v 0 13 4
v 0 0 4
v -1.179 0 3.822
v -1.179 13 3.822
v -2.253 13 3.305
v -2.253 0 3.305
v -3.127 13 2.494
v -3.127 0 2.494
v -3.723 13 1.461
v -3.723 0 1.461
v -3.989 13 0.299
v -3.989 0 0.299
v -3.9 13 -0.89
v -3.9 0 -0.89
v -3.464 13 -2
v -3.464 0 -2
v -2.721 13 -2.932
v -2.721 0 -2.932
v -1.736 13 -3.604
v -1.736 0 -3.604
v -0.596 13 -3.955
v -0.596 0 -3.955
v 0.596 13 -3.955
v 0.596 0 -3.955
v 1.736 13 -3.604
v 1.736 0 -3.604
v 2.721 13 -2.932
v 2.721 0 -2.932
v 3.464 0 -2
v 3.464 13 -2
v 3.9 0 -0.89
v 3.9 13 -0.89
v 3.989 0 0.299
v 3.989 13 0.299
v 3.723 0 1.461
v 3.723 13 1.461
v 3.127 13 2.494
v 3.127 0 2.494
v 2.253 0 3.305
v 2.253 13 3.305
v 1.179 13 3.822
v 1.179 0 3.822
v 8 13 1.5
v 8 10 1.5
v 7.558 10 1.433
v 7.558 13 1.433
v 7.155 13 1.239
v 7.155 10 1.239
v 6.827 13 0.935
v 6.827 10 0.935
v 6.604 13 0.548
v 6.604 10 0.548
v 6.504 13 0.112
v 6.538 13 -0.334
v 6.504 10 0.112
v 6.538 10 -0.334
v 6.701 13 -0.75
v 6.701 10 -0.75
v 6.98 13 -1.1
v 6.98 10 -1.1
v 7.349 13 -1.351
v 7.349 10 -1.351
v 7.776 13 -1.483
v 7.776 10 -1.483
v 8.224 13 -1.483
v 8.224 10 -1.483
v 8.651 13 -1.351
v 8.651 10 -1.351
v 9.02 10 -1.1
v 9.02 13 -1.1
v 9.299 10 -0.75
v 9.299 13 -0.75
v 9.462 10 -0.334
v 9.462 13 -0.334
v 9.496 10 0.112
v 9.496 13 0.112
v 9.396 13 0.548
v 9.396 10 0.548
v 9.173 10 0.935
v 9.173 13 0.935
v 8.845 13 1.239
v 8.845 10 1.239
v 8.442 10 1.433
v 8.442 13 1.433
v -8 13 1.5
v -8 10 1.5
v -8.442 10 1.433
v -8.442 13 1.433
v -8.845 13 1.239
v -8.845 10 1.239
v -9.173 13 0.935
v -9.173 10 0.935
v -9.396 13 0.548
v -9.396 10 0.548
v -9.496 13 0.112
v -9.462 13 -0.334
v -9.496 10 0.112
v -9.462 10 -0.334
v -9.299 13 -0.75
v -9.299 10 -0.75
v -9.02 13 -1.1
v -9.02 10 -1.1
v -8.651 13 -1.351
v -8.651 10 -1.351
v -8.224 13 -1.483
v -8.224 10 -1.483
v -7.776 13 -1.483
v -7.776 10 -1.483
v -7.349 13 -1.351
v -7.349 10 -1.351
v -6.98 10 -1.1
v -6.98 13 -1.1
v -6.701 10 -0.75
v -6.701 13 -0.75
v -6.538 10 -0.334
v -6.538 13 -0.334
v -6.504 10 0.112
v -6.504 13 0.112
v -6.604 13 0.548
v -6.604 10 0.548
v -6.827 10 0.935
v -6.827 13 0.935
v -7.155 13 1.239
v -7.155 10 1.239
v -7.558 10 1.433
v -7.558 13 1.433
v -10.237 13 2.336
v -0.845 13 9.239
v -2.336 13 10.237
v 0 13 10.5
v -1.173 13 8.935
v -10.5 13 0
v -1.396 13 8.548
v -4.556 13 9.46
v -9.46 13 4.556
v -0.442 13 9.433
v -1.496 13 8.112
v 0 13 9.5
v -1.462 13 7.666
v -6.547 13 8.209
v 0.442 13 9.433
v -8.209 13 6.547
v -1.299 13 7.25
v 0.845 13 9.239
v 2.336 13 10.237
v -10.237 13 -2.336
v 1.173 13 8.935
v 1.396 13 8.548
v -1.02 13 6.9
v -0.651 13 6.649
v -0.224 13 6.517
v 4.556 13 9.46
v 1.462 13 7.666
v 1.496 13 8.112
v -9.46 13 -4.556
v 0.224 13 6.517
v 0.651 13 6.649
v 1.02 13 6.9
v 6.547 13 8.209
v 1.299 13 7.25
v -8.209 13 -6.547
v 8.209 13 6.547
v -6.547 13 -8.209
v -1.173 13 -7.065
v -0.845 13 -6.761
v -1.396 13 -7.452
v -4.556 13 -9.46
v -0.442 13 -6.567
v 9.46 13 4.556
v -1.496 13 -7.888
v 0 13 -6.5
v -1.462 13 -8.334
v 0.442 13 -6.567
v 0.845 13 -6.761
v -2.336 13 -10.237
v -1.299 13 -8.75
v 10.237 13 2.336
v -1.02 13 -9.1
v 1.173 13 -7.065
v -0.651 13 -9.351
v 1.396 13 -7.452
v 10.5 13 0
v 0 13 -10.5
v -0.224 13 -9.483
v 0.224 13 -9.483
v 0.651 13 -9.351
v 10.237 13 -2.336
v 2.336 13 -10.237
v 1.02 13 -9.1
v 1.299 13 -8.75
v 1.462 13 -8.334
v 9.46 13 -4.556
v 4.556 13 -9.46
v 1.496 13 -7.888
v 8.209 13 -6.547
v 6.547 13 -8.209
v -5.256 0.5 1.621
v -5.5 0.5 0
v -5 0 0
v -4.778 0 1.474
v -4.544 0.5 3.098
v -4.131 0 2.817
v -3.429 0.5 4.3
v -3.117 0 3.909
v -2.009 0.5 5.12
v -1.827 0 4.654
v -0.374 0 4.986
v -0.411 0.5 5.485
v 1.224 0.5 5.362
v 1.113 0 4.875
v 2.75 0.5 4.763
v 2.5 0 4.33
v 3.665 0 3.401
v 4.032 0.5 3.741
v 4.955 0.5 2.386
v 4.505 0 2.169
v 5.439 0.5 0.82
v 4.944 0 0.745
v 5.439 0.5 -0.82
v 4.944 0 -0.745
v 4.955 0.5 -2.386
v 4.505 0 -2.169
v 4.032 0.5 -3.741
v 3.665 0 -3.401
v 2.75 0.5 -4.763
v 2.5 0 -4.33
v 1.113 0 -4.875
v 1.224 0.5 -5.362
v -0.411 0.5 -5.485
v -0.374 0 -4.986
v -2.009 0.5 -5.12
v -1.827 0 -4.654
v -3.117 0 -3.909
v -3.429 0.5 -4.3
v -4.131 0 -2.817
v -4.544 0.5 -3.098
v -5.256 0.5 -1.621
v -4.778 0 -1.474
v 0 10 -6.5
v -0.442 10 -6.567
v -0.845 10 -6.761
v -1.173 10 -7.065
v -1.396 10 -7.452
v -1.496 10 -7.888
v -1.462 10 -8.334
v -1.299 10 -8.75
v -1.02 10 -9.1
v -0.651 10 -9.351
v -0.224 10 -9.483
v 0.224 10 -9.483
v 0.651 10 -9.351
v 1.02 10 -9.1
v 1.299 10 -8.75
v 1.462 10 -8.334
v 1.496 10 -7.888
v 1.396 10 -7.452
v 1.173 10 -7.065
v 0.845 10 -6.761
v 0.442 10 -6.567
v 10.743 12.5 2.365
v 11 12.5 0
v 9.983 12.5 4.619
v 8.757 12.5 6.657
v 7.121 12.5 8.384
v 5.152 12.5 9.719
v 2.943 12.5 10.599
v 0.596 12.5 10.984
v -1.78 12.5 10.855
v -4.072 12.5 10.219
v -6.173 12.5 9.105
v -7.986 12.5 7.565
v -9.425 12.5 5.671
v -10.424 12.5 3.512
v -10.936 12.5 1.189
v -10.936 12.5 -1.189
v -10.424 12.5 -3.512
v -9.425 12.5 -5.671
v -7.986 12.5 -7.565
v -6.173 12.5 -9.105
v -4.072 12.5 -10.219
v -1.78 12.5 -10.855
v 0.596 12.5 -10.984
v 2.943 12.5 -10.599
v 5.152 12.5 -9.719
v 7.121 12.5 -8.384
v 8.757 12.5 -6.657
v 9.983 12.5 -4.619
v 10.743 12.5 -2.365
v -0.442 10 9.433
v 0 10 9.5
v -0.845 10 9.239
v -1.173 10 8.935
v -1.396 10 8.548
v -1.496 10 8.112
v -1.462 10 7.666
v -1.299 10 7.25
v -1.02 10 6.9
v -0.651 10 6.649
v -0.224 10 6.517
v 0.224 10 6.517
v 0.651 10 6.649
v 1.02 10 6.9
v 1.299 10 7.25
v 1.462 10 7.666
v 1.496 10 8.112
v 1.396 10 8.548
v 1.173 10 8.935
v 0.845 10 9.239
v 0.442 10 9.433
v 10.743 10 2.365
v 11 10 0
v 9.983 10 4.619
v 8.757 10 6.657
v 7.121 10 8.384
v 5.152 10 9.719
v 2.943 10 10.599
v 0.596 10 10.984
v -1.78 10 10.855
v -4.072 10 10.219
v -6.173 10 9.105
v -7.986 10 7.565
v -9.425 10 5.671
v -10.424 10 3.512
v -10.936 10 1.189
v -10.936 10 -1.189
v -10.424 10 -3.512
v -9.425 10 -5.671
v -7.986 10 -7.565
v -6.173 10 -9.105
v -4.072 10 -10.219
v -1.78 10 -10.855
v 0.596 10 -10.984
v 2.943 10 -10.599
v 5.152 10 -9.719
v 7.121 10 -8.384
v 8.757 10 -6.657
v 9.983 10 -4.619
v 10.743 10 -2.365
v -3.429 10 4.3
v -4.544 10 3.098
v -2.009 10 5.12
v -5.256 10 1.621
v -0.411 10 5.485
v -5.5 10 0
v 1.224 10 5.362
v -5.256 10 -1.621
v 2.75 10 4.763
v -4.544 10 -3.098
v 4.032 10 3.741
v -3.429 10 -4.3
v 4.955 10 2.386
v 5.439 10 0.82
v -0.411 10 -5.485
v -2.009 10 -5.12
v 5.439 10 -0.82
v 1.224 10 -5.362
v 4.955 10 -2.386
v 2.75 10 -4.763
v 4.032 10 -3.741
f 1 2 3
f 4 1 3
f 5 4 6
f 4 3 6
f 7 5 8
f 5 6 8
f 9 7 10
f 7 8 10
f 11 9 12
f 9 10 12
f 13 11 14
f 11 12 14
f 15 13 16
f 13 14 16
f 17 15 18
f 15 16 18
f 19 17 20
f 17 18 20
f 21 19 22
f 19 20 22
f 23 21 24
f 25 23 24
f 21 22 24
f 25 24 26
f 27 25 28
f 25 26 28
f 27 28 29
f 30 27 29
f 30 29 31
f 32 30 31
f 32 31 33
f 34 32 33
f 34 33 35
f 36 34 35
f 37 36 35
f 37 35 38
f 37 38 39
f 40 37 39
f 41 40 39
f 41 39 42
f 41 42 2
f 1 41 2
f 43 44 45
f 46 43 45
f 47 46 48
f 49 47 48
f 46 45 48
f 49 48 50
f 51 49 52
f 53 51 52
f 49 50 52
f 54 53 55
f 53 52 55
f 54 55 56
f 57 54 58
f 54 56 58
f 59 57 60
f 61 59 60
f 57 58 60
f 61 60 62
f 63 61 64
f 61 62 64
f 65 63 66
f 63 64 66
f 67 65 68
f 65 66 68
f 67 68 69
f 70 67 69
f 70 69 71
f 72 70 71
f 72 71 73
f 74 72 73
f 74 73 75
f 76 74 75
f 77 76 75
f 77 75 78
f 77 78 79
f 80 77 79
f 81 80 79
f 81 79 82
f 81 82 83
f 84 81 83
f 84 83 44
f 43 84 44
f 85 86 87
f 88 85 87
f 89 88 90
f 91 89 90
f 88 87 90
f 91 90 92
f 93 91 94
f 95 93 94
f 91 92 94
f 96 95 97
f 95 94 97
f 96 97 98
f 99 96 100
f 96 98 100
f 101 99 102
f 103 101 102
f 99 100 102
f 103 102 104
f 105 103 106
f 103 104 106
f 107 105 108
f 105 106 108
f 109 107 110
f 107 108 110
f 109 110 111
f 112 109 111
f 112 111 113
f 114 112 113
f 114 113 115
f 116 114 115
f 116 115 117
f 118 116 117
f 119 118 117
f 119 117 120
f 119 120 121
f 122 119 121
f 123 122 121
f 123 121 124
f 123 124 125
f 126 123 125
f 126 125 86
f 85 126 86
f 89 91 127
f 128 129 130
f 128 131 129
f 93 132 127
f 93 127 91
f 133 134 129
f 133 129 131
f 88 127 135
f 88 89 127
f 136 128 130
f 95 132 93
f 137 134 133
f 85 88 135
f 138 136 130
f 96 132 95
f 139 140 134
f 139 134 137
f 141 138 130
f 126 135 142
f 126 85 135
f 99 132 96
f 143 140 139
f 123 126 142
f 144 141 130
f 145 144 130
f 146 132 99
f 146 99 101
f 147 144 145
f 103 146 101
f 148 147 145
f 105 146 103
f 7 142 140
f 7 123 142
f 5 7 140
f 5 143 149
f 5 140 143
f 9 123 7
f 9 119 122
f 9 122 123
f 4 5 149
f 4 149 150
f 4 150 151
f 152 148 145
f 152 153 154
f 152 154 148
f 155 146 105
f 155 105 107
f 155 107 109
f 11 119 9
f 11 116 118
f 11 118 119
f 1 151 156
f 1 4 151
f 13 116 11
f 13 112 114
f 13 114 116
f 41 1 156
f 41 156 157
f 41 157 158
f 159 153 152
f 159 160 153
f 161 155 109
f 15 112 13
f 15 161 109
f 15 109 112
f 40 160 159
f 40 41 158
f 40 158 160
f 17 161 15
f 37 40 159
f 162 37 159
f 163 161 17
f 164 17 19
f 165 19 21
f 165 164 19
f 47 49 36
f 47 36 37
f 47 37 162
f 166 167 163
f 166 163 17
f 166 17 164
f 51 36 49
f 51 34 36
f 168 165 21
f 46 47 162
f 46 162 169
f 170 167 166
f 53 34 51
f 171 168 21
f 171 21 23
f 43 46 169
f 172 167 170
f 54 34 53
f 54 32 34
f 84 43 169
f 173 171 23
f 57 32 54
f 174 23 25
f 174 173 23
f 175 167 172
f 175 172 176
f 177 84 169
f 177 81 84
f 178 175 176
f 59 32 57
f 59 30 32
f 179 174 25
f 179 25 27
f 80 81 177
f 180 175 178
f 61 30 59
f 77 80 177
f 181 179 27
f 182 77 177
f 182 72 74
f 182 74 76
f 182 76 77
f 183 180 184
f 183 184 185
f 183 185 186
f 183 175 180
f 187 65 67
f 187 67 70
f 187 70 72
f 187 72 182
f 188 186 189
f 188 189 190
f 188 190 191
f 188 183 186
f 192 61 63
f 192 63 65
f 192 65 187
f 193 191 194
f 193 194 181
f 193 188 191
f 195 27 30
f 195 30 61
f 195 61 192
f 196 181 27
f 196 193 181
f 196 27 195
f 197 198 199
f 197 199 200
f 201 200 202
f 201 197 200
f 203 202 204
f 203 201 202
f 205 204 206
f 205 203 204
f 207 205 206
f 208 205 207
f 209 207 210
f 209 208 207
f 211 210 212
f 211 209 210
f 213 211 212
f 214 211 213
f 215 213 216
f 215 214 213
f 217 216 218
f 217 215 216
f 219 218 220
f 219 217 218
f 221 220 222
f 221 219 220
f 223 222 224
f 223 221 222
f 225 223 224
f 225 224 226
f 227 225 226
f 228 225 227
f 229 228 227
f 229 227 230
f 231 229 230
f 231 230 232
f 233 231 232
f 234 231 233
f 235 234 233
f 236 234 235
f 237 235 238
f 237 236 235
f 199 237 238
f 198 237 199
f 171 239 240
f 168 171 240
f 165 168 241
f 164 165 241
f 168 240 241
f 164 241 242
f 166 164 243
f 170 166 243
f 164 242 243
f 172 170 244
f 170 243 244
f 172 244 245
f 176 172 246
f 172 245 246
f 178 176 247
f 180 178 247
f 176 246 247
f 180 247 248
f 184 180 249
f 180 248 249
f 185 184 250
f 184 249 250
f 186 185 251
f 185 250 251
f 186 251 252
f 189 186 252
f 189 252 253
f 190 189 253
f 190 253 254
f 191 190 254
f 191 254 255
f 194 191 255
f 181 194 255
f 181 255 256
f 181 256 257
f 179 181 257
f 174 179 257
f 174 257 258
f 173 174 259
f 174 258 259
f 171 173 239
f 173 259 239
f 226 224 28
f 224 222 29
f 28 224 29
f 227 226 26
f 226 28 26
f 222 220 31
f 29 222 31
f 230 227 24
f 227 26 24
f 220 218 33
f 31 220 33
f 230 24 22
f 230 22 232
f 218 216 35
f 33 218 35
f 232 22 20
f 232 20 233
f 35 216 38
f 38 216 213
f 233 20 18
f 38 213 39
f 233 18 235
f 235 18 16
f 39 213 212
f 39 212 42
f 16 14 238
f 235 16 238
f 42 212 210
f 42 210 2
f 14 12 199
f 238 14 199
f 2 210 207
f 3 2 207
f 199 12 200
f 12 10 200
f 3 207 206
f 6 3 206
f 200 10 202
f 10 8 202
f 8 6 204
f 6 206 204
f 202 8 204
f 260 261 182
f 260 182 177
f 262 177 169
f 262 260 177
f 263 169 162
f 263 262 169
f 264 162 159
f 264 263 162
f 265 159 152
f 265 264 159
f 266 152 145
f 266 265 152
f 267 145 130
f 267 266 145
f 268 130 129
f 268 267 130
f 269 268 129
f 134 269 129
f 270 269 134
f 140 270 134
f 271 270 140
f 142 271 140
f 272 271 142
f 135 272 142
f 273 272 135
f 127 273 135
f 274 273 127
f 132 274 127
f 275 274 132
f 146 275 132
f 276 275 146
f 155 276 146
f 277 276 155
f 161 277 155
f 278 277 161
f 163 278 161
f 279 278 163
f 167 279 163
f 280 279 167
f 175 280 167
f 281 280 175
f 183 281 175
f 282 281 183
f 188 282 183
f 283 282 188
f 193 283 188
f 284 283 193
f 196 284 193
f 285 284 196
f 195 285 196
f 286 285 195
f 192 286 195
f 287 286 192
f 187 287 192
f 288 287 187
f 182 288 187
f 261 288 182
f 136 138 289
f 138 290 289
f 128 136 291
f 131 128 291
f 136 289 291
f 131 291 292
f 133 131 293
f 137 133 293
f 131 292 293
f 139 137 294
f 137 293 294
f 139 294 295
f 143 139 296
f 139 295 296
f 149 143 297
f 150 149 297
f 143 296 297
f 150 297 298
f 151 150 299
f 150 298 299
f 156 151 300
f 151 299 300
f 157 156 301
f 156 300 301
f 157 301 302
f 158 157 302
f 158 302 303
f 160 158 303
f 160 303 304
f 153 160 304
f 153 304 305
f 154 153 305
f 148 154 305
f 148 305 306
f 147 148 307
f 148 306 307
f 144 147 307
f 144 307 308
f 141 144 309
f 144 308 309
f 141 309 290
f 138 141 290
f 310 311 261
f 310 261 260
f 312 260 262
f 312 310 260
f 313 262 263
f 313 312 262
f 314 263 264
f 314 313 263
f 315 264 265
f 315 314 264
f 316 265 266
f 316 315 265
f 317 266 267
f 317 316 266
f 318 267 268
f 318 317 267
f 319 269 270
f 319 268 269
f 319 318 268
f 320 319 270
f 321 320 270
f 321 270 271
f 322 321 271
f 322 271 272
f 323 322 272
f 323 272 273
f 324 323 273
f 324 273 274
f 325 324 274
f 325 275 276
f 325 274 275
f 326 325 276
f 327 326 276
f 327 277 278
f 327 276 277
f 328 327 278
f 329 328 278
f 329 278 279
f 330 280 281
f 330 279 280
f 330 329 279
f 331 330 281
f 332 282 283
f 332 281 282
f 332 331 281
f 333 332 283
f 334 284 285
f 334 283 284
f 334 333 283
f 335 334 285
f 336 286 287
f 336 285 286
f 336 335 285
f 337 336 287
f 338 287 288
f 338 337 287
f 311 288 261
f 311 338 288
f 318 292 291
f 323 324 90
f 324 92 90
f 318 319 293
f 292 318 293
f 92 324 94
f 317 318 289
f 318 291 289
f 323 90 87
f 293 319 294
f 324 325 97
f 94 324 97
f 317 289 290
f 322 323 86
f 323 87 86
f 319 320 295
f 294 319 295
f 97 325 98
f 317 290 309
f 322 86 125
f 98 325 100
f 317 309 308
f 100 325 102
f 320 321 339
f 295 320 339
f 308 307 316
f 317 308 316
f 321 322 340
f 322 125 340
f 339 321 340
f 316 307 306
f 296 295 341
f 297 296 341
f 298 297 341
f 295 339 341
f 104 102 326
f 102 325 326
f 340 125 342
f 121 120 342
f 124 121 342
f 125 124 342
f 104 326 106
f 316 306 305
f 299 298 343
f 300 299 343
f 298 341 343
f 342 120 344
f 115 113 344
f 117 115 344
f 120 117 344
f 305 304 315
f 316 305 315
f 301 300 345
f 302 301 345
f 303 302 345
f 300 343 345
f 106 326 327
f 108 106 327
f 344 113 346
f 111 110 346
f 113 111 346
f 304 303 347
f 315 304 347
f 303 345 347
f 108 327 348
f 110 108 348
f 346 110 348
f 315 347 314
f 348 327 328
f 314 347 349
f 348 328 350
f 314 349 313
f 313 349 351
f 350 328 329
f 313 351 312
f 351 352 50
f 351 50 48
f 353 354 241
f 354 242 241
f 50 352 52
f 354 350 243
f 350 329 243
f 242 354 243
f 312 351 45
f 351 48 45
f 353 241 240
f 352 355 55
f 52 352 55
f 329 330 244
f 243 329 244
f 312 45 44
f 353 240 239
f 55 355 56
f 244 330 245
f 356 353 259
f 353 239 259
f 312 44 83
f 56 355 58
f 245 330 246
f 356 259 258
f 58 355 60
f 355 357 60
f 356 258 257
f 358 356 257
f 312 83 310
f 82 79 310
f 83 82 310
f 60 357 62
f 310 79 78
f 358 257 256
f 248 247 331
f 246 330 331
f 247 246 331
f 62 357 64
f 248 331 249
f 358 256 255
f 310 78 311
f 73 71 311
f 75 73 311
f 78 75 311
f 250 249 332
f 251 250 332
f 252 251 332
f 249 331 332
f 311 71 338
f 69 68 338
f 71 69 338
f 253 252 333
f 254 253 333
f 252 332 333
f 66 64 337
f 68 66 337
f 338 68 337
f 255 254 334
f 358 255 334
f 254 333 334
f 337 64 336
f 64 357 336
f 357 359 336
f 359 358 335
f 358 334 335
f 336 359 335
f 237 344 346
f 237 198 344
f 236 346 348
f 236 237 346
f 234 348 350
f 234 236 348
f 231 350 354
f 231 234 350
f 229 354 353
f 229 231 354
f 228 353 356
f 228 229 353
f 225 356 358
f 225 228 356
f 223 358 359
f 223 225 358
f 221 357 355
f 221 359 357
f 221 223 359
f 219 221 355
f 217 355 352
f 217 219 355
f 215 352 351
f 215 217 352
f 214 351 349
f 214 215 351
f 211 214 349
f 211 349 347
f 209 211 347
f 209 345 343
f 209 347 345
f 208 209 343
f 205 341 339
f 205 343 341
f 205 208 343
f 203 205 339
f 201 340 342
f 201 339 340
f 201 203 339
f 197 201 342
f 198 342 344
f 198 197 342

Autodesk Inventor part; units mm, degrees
ref_plane "YZ Plane" through (0, 0, 0) normal (1, 0, 0) x (0, 1, 0)
ref_plane "XZ Plane" through (0, 0, 0) normal (0, 1, 0) x (-1, 0, 0)
ref_plane "XY Plane" through (0, 0, 0) normal (0, 0, 1) x (1, 0, 0)
sketch "Szkic1" plane through (0, 0, 0) normal (0, 1, 0) x (-1, 0, 0)
  circle A0 centre (0, 0) radius 5.5
  dimension "d0" = 11
extrude "Wyciągnięcie proste1" add sketch "Szkic1" along normal blind 10
sketch "Szkic2" plane through (0, 10, 0) normal (0, 1, 0) x (1, 0, 0)
  circle A0 centre (0, 0) radius 11
  dimension "d3" = 22
extrude "Wyciągnięcie proste2" add sketch "Szkic2" along normal blind 3
sketch "Szkic3" plane through (0, 13, 0) normal (0, 1, 0) x (1, 0, 0)
  point P0 (0, 0)
  point P1 (-8, 0)
  point P2 (0, -8)
  point P3 (8, 0)
  point P4 (0, 8)
  dimension "d6" = 8
  dimension "d9" = 360
hole "Otwór1" at (-8, 13, 0) at (0, 13, 8) at (8, 13, 0) at (0, 13, -8) direction (0, -1, 0) diameter 3 end through all
sketch "Szkic4" plane through (0, 13, 0) normal (0, 1, 0) x (1, 0, 0)
  point P0 (0, 0)
  point P1 (0, 0)
hole "Otwór2" at (0, 13, 0) direction (0, -1, 0) diameter 8 end through all
chamfer "Faza1" distance 0.5 angle 45 2 edges at (-11, 13, 0) (5.5, 0, 0)
thread "Gwint1" size "TR8x1.5" class "7H" standard "ISO Metric Trapezoidal Threads" full length
properties part number "25_nakrętka trapezowa" material "Mosiądz, miękki żółty"
